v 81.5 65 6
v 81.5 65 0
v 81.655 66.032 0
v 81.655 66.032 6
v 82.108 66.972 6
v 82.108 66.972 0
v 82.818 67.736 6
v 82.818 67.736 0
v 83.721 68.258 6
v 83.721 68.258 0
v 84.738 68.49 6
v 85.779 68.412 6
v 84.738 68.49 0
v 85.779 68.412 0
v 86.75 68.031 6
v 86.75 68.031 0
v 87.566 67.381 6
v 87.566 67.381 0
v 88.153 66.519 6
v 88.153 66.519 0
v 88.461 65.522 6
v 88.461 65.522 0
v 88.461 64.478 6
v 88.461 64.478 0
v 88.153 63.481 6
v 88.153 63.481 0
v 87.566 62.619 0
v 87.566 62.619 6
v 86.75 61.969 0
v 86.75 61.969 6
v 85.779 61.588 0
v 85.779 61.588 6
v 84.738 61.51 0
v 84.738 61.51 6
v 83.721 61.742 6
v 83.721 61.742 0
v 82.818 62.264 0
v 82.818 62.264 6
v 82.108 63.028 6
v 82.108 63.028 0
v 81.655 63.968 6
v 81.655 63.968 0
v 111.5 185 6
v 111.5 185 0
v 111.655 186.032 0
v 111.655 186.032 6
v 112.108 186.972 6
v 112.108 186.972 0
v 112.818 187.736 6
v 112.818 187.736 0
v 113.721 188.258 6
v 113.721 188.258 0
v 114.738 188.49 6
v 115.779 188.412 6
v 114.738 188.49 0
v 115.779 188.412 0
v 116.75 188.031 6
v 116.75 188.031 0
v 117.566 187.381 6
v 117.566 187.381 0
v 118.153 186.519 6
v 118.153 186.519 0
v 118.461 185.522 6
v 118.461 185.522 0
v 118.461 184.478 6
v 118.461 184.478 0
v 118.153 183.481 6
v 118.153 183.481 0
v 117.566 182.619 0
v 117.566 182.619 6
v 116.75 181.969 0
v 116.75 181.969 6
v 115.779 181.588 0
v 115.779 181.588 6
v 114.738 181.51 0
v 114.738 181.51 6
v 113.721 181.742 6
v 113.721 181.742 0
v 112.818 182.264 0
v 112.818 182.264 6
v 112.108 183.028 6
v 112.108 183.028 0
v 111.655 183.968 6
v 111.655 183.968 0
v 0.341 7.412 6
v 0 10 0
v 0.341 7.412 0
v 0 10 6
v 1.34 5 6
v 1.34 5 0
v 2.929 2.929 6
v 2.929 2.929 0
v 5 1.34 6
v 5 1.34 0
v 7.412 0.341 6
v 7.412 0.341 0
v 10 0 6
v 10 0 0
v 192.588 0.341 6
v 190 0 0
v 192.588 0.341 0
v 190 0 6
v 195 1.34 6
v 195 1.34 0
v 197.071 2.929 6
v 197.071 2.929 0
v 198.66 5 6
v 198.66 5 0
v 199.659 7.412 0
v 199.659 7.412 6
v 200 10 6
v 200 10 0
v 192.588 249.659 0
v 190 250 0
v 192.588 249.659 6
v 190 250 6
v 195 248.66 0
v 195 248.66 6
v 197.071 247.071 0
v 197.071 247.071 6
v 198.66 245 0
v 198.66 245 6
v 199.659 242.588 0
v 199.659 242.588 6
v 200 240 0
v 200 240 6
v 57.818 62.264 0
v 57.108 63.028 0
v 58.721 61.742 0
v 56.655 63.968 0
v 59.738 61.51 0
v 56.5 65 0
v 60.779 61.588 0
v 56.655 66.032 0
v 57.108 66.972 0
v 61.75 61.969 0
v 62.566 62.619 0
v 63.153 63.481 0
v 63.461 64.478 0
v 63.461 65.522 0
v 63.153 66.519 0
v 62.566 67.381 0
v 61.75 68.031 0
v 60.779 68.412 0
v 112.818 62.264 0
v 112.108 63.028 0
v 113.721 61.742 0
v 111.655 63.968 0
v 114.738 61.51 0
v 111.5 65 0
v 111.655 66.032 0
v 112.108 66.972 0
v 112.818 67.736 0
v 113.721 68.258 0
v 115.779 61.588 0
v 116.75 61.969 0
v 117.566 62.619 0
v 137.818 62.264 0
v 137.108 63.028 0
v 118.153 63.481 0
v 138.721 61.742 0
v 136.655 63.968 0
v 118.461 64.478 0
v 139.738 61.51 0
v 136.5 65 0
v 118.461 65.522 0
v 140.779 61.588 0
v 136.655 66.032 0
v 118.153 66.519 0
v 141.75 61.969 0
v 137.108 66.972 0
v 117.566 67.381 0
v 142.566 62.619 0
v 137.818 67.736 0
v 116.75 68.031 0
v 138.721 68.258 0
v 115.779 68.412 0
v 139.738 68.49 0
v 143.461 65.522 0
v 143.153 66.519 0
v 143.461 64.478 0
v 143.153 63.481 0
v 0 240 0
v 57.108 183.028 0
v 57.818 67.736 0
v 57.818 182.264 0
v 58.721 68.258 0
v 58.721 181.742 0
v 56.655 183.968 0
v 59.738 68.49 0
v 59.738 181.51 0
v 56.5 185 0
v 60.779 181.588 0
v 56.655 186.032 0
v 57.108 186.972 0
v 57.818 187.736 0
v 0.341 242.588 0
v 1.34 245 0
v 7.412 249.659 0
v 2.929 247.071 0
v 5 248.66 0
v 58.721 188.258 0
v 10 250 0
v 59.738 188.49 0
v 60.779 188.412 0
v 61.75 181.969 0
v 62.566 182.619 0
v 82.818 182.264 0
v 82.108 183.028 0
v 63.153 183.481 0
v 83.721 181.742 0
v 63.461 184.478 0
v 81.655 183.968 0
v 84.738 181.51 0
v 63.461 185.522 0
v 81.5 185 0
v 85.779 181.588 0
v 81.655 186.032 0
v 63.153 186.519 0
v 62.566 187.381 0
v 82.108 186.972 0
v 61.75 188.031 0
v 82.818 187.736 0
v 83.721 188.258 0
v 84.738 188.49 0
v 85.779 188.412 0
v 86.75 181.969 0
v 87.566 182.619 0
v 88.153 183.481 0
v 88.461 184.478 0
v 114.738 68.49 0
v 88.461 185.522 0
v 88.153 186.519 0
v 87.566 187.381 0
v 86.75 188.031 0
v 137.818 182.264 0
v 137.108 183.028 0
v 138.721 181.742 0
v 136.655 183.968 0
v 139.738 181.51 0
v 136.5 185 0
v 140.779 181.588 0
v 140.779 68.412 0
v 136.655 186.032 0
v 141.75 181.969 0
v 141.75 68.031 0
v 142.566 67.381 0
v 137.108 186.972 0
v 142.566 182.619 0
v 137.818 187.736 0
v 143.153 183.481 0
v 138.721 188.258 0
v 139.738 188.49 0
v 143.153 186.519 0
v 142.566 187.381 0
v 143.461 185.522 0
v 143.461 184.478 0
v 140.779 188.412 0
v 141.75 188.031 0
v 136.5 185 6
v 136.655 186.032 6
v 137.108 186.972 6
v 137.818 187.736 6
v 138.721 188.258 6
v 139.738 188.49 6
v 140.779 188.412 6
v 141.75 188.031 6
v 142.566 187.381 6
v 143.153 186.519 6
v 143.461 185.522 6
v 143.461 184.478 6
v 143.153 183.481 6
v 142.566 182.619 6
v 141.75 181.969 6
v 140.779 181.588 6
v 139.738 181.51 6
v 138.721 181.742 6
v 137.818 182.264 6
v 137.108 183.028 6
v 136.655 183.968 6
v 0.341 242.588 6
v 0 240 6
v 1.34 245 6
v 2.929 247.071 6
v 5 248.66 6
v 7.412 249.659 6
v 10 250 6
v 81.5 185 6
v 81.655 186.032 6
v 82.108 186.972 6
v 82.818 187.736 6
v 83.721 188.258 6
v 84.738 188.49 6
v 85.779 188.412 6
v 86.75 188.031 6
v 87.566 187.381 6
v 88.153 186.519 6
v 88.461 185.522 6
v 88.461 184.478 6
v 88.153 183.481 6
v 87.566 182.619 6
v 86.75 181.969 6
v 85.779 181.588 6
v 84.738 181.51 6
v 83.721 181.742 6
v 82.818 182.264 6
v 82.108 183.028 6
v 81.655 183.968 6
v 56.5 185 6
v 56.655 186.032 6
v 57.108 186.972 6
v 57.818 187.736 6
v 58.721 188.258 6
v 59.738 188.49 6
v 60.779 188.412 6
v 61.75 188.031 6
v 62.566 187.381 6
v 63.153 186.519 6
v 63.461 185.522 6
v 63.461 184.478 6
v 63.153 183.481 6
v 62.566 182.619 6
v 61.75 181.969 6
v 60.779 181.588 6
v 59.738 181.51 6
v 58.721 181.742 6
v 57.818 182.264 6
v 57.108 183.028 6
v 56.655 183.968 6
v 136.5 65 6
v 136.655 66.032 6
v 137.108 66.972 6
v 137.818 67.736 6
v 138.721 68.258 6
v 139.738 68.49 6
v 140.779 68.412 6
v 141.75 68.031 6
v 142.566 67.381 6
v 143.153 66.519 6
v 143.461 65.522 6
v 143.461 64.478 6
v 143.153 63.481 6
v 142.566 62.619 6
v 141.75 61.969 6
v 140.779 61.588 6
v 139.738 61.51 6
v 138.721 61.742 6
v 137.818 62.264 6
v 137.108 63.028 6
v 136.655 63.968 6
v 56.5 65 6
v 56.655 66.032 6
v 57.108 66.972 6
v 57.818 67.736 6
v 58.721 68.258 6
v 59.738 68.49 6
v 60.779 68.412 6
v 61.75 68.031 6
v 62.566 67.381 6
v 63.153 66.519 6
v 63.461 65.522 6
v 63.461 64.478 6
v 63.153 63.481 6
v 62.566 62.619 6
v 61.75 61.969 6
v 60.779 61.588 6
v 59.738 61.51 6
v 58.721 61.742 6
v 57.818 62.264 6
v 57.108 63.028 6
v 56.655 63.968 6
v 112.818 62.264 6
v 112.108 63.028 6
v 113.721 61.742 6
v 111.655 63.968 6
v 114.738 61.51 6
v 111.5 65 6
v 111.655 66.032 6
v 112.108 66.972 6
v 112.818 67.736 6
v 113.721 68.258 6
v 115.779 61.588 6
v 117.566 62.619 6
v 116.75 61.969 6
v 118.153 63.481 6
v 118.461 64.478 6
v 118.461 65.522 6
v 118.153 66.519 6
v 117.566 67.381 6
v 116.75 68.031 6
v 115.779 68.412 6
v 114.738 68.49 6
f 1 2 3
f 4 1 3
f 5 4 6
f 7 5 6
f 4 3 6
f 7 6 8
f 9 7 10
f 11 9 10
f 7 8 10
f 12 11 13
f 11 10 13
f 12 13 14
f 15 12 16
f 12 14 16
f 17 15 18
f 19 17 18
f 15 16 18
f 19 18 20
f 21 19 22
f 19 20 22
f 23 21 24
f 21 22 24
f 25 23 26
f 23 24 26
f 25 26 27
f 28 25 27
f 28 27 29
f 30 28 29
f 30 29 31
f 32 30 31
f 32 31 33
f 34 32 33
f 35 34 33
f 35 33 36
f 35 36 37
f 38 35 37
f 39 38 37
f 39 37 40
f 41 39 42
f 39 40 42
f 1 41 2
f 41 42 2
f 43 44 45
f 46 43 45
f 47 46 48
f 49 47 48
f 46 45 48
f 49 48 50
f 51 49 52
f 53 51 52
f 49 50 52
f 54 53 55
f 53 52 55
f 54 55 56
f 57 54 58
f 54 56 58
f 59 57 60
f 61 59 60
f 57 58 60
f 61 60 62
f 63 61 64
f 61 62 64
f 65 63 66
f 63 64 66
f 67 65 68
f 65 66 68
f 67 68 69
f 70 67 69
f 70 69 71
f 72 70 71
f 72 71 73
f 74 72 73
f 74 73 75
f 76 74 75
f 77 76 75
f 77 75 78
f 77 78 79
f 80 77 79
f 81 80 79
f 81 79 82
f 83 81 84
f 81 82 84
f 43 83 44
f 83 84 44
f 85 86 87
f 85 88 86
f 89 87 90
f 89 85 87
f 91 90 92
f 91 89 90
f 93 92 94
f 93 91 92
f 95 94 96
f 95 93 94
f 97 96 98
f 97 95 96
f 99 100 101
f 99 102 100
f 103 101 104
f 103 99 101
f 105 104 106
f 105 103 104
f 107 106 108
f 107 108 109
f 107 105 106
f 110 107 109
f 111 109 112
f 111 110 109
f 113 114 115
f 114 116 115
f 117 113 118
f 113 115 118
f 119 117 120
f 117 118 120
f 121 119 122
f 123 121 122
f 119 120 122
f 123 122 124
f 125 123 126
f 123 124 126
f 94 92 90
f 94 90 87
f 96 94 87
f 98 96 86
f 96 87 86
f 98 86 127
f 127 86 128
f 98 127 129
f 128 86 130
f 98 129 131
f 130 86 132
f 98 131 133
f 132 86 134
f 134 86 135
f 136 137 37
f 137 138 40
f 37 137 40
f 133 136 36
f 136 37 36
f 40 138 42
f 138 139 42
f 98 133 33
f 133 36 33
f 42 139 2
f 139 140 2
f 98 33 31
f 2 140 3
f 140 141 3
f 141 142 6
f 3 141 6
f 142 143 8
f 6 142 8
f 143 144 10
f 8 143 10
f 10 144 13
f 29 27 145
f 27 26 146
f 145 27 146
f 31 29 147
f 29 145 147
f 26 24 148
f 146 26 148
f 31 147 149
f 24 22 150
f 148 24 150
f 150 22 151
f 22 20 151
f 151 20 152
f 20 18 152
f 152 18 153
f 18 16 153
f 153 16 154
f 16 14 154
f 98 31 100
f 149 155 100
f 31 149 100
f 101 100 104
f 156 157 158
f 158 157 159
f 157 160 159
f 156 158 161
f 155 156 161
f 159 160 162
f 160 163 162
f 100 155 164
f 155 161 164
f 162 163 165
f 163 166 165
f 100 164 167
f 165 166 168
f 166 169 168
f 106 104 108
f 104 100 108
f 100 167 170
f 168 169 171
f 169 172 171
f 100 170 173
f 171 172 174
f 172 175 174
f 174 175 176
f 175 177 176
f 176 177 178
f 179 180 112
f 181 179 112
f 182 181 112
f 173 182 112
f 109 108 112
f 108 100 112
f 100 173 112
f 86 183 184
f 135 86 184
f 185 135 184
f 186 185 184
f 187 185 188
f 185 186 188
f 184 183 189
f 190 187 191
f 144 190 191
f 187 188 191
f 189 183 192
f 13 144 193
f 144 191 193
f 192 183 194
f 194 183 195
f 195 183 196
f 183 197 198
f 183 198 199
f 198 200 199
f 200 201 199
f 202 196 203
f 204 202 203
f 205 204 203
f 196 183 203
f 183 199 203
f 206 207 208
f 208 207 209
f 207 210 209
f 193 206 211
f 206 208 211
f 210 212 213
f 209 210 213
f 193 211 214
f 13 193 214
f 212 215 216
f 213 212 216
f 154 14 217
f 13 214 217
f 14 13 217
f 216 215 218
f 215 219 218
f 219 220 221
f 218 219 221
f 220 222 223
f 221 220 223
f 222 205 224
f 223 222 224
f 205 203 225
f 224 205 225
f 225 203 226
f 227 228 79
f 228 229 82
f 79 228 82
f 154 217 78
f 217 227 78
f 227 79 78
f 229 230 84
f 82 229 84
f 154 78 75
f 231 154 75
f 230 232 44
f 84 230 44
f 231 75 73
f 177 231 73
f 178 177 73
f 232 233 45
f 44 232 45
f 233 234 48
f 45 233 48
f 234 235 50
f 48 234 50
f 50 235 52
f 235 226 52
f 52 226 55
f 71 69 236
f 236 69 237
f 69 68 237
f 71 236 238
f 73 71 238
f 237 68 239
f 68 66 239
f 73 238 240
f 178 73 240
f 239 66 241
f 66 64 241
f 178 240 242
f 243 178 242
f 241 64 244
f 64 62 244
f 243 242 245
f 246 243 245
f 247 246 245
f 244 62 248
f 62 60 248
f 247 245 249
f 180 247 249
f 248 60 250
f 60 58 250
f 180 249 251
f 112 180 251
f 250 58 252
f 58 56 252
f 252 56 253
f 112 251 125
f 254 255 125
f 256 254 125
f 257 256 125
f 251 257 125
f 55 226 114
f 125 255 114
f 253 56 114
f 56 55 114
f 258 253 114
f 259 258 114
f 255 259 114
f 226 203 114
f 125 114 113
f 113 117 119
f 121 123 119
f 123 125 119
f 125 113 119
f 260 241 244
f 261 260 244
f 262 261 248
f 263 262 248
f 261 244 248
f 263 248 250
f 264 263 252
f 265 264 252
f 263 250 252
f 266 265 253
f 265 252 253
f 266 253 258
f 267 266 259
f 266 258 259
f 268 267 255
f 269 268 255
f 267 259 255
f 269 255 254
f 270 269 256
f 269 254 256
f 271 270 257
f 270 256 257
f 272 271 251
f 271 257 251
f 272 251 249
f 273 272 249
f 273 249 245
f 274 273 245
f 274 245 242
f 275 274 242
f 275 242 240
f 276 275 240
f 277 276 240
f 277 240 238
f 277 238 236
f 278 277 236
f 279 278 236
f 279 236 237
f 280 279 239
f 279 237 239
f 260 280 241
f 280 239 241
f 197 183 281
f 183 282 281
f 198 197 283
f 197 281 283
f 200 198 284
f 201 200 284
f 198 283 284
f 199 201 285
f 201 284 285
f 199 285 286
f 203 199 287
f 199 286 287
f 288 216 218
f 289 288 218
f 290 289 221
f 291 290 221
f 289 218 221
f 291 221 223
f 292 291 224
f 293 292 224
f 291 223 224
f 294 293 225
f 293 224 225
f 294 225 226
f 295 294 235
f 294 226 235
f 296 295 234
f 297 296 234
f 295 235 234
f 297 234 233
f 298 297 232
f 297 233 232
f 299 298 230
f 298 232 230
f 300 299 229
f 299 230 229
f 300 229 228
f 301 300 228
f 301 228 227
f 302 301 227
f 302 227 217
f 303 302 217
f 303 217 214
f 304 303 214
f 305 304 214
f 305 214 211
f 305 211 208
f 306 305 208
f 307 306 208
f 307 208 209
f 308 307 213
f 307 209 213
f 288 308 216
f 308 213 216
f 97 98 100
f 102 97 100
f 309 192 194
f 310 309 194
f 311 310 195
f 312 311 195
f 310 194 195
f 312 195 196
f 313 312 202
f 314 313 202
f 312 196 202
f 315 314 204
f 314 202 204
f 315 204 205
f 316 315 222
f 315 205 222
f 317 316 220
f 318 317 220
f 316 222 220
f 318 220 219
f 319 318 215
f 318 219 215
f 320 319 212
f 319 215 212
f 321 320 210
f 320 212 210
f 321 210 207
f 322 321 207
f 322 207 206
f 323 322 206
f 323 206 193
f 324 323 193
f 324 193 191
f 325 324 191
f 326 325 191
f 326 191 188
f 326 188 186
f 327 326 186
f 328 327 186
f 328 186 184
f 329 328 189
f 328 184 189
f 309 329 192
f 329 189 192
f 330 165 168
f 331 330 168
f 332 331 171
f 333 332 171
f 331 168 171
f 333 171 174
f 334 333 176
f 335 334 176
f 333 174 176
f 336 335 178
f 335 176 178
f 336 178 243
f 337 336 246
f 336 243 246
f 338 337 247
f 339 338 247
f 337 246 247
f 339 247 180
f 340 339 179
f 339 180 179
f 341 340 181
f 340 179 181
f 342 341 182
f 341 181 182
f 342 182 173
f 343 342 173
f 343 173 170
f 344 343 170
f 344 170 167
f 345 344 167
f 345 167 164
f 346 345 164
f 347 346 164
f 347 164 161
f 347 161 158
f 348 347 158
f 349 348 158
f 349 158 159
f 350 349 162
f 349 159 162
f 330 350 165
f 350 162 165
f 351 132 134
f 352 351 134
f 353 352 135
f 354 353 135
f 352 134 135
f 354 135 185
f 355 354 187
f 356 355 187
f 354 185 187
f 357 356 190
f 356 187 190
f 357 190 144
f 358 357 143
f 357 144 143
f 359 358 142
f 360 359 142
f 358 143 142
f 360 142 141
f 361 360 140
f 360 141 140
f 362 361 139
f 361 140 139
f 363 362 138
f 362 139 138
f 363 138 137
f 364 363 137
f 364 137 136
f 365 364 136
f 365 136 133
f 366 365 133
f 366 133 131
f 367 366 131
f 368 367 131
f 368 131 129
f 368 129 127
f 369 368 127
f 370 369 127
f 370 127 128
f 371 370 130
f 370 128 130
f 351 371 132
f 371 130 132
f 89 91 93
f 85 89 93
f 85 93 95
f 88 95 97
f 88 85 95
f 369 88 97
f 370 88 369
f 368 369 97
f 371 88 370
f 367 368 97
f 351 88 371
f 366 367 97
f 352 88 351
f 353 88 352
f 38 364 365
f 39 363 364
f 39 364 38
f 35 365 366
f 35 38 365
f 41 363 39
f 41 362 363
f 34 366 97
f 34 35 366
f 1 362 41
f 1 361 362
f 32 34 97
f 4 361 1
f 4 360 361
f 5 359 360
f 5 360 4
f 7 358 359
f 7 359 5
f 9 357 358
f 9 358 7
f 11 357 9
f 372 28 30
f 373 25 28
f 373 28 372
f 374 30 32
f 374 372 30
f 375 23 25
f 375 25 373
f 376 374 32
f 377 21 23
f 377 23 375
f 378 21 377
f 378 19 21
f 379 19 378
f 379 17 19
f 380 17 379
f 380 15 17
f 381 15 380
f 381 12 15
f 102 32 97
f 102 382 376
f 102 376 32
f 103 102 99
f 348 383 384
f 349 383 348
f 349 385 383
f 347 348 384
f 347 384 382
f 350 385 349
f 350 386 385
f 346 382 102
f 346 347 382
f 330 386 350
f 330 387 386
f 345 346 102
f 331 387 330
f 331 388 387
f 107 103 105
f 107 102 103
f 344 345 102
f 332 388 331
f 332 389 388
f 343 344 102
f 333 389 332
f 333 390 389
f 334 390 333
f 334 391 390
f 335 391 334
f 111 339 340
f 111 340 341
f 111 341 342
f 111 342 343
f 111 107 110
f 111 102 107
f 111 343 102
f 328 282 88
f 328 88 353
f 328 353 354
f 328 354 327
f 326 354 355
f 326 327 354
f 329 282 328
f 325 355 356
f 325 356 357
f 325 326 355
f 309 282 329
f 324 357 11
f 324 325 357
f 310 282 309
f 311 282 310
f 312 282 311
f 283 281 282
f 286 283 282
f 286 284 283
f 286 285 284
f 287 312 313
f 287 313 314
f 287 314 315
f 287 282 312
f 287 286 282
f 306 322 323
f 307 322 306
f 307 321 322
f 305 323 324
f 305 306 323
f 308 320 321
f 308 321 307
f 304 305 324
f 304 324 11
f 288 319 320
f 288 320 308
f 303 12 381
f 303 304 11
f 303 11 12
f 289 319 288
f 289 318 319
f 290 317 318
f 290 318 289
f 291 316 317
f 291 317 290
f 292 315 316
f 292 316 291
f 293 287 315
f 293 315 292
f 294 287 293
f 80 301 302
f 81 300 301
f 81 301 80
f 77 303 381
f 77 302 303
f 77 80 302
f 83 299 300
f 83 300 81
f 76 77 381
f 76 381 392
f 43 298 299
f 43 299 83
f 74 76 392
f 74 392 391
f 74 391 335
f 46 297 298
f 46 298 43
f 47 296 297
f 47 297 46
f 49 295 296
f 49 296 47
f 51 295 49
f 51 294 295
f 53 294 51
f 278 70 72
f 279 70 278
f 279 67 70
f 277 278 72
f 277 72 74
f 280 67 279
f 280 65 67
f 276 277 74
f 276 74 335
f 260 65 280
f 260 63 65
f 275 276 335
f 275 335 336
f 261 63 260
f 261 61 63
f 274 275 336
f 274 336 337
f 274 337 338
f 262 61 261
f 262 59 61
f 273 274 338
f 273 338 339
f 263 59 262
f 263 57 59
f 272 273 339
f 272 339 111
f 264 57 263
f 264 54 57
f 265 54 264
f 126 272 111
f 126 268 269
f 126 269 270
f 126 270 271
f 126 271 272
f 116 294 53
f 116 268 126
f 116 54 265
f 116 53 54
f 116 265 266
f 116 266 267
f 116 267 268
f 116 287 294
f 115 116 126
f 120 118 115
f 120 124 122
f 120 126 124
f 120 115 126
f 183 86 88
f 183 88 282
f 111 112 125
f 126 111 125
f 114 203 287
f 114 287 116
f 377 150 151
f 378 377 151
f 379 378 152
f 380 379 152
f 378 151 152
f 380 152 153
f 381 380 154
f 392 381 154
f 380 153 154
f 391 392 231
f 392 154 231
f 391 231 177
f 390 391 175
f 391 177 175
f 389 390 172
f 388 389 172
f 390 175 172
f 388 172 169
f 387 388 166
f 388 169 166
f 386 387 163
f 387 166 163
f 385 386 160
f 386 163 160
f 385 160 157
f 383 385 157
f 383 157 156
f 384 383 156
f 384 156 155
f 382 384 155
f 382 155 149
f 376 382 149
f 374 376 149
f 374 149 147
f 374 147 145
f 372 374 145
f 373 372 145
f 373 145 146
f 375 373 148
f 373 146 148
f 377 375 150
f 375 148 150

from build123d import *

# Parameters (mm, degrees)
SKETCH1_W           = 200
SKETCH1_H           = 250
BOSS_EXTRUDE1_DEPTH = 6
SKETCH2_R           = 3.5
CUT_EXTRUDE1_DEPTH  = 6
FILLET1_R           = 10


with BuildPart() as part:
    # Sketch1 → Boss-Extrude1 (new body)
    with BuildSketch(Plane.XY):
        with Locations((100, 125)):
            Rectangle(SKETCH1_W, SKETCH1_H)
    extrude(amount=BOSS_EXTRUDE1_DEPTH)

    # Sketch2 → Cut-Extrude1 (cut)
    with BuildSketch(Plane(origin=(0, 0, 0), x_dir=(-1, 0, 0), z_dir=(0, 0, -1))):
        with Locations((-60, 65)):
            Circle(SKETCH2_R)
        with Locations((-85, 65)):
            Circle(SKETCH2_R)
        with Locations((-140, 65)):
            Circle(SKETCH2_R)
        with Locations((-115, 65)):
            Circle(SKETCH2_R)
        with Locations((-140, 185)):
            Circle(SKETCH2_R)
        with Locations((-115, 185)):
            Circle(SKETCH2_R)
        with Locations((-85, 185)):
            Circle(SKETCH2_R)
        with Locations((-60, 185)):
            Circle(SKETCH2_R)
    extrude(amount=-CUT_EXTRUDE1_DEPTH, mode=Mode.SUBTRACT)

    # Fillet1
    fillet1_edges = [part.edges().sort_by_distance(p)[0] for p in [
        (0, 250, 3),
        (200, 250, 3),
        (200, 0, 3),
        (0, 0, 3),
    ]]
    fillet(fillet1_edges, radius=FILLET1_R)


solid = part.part
